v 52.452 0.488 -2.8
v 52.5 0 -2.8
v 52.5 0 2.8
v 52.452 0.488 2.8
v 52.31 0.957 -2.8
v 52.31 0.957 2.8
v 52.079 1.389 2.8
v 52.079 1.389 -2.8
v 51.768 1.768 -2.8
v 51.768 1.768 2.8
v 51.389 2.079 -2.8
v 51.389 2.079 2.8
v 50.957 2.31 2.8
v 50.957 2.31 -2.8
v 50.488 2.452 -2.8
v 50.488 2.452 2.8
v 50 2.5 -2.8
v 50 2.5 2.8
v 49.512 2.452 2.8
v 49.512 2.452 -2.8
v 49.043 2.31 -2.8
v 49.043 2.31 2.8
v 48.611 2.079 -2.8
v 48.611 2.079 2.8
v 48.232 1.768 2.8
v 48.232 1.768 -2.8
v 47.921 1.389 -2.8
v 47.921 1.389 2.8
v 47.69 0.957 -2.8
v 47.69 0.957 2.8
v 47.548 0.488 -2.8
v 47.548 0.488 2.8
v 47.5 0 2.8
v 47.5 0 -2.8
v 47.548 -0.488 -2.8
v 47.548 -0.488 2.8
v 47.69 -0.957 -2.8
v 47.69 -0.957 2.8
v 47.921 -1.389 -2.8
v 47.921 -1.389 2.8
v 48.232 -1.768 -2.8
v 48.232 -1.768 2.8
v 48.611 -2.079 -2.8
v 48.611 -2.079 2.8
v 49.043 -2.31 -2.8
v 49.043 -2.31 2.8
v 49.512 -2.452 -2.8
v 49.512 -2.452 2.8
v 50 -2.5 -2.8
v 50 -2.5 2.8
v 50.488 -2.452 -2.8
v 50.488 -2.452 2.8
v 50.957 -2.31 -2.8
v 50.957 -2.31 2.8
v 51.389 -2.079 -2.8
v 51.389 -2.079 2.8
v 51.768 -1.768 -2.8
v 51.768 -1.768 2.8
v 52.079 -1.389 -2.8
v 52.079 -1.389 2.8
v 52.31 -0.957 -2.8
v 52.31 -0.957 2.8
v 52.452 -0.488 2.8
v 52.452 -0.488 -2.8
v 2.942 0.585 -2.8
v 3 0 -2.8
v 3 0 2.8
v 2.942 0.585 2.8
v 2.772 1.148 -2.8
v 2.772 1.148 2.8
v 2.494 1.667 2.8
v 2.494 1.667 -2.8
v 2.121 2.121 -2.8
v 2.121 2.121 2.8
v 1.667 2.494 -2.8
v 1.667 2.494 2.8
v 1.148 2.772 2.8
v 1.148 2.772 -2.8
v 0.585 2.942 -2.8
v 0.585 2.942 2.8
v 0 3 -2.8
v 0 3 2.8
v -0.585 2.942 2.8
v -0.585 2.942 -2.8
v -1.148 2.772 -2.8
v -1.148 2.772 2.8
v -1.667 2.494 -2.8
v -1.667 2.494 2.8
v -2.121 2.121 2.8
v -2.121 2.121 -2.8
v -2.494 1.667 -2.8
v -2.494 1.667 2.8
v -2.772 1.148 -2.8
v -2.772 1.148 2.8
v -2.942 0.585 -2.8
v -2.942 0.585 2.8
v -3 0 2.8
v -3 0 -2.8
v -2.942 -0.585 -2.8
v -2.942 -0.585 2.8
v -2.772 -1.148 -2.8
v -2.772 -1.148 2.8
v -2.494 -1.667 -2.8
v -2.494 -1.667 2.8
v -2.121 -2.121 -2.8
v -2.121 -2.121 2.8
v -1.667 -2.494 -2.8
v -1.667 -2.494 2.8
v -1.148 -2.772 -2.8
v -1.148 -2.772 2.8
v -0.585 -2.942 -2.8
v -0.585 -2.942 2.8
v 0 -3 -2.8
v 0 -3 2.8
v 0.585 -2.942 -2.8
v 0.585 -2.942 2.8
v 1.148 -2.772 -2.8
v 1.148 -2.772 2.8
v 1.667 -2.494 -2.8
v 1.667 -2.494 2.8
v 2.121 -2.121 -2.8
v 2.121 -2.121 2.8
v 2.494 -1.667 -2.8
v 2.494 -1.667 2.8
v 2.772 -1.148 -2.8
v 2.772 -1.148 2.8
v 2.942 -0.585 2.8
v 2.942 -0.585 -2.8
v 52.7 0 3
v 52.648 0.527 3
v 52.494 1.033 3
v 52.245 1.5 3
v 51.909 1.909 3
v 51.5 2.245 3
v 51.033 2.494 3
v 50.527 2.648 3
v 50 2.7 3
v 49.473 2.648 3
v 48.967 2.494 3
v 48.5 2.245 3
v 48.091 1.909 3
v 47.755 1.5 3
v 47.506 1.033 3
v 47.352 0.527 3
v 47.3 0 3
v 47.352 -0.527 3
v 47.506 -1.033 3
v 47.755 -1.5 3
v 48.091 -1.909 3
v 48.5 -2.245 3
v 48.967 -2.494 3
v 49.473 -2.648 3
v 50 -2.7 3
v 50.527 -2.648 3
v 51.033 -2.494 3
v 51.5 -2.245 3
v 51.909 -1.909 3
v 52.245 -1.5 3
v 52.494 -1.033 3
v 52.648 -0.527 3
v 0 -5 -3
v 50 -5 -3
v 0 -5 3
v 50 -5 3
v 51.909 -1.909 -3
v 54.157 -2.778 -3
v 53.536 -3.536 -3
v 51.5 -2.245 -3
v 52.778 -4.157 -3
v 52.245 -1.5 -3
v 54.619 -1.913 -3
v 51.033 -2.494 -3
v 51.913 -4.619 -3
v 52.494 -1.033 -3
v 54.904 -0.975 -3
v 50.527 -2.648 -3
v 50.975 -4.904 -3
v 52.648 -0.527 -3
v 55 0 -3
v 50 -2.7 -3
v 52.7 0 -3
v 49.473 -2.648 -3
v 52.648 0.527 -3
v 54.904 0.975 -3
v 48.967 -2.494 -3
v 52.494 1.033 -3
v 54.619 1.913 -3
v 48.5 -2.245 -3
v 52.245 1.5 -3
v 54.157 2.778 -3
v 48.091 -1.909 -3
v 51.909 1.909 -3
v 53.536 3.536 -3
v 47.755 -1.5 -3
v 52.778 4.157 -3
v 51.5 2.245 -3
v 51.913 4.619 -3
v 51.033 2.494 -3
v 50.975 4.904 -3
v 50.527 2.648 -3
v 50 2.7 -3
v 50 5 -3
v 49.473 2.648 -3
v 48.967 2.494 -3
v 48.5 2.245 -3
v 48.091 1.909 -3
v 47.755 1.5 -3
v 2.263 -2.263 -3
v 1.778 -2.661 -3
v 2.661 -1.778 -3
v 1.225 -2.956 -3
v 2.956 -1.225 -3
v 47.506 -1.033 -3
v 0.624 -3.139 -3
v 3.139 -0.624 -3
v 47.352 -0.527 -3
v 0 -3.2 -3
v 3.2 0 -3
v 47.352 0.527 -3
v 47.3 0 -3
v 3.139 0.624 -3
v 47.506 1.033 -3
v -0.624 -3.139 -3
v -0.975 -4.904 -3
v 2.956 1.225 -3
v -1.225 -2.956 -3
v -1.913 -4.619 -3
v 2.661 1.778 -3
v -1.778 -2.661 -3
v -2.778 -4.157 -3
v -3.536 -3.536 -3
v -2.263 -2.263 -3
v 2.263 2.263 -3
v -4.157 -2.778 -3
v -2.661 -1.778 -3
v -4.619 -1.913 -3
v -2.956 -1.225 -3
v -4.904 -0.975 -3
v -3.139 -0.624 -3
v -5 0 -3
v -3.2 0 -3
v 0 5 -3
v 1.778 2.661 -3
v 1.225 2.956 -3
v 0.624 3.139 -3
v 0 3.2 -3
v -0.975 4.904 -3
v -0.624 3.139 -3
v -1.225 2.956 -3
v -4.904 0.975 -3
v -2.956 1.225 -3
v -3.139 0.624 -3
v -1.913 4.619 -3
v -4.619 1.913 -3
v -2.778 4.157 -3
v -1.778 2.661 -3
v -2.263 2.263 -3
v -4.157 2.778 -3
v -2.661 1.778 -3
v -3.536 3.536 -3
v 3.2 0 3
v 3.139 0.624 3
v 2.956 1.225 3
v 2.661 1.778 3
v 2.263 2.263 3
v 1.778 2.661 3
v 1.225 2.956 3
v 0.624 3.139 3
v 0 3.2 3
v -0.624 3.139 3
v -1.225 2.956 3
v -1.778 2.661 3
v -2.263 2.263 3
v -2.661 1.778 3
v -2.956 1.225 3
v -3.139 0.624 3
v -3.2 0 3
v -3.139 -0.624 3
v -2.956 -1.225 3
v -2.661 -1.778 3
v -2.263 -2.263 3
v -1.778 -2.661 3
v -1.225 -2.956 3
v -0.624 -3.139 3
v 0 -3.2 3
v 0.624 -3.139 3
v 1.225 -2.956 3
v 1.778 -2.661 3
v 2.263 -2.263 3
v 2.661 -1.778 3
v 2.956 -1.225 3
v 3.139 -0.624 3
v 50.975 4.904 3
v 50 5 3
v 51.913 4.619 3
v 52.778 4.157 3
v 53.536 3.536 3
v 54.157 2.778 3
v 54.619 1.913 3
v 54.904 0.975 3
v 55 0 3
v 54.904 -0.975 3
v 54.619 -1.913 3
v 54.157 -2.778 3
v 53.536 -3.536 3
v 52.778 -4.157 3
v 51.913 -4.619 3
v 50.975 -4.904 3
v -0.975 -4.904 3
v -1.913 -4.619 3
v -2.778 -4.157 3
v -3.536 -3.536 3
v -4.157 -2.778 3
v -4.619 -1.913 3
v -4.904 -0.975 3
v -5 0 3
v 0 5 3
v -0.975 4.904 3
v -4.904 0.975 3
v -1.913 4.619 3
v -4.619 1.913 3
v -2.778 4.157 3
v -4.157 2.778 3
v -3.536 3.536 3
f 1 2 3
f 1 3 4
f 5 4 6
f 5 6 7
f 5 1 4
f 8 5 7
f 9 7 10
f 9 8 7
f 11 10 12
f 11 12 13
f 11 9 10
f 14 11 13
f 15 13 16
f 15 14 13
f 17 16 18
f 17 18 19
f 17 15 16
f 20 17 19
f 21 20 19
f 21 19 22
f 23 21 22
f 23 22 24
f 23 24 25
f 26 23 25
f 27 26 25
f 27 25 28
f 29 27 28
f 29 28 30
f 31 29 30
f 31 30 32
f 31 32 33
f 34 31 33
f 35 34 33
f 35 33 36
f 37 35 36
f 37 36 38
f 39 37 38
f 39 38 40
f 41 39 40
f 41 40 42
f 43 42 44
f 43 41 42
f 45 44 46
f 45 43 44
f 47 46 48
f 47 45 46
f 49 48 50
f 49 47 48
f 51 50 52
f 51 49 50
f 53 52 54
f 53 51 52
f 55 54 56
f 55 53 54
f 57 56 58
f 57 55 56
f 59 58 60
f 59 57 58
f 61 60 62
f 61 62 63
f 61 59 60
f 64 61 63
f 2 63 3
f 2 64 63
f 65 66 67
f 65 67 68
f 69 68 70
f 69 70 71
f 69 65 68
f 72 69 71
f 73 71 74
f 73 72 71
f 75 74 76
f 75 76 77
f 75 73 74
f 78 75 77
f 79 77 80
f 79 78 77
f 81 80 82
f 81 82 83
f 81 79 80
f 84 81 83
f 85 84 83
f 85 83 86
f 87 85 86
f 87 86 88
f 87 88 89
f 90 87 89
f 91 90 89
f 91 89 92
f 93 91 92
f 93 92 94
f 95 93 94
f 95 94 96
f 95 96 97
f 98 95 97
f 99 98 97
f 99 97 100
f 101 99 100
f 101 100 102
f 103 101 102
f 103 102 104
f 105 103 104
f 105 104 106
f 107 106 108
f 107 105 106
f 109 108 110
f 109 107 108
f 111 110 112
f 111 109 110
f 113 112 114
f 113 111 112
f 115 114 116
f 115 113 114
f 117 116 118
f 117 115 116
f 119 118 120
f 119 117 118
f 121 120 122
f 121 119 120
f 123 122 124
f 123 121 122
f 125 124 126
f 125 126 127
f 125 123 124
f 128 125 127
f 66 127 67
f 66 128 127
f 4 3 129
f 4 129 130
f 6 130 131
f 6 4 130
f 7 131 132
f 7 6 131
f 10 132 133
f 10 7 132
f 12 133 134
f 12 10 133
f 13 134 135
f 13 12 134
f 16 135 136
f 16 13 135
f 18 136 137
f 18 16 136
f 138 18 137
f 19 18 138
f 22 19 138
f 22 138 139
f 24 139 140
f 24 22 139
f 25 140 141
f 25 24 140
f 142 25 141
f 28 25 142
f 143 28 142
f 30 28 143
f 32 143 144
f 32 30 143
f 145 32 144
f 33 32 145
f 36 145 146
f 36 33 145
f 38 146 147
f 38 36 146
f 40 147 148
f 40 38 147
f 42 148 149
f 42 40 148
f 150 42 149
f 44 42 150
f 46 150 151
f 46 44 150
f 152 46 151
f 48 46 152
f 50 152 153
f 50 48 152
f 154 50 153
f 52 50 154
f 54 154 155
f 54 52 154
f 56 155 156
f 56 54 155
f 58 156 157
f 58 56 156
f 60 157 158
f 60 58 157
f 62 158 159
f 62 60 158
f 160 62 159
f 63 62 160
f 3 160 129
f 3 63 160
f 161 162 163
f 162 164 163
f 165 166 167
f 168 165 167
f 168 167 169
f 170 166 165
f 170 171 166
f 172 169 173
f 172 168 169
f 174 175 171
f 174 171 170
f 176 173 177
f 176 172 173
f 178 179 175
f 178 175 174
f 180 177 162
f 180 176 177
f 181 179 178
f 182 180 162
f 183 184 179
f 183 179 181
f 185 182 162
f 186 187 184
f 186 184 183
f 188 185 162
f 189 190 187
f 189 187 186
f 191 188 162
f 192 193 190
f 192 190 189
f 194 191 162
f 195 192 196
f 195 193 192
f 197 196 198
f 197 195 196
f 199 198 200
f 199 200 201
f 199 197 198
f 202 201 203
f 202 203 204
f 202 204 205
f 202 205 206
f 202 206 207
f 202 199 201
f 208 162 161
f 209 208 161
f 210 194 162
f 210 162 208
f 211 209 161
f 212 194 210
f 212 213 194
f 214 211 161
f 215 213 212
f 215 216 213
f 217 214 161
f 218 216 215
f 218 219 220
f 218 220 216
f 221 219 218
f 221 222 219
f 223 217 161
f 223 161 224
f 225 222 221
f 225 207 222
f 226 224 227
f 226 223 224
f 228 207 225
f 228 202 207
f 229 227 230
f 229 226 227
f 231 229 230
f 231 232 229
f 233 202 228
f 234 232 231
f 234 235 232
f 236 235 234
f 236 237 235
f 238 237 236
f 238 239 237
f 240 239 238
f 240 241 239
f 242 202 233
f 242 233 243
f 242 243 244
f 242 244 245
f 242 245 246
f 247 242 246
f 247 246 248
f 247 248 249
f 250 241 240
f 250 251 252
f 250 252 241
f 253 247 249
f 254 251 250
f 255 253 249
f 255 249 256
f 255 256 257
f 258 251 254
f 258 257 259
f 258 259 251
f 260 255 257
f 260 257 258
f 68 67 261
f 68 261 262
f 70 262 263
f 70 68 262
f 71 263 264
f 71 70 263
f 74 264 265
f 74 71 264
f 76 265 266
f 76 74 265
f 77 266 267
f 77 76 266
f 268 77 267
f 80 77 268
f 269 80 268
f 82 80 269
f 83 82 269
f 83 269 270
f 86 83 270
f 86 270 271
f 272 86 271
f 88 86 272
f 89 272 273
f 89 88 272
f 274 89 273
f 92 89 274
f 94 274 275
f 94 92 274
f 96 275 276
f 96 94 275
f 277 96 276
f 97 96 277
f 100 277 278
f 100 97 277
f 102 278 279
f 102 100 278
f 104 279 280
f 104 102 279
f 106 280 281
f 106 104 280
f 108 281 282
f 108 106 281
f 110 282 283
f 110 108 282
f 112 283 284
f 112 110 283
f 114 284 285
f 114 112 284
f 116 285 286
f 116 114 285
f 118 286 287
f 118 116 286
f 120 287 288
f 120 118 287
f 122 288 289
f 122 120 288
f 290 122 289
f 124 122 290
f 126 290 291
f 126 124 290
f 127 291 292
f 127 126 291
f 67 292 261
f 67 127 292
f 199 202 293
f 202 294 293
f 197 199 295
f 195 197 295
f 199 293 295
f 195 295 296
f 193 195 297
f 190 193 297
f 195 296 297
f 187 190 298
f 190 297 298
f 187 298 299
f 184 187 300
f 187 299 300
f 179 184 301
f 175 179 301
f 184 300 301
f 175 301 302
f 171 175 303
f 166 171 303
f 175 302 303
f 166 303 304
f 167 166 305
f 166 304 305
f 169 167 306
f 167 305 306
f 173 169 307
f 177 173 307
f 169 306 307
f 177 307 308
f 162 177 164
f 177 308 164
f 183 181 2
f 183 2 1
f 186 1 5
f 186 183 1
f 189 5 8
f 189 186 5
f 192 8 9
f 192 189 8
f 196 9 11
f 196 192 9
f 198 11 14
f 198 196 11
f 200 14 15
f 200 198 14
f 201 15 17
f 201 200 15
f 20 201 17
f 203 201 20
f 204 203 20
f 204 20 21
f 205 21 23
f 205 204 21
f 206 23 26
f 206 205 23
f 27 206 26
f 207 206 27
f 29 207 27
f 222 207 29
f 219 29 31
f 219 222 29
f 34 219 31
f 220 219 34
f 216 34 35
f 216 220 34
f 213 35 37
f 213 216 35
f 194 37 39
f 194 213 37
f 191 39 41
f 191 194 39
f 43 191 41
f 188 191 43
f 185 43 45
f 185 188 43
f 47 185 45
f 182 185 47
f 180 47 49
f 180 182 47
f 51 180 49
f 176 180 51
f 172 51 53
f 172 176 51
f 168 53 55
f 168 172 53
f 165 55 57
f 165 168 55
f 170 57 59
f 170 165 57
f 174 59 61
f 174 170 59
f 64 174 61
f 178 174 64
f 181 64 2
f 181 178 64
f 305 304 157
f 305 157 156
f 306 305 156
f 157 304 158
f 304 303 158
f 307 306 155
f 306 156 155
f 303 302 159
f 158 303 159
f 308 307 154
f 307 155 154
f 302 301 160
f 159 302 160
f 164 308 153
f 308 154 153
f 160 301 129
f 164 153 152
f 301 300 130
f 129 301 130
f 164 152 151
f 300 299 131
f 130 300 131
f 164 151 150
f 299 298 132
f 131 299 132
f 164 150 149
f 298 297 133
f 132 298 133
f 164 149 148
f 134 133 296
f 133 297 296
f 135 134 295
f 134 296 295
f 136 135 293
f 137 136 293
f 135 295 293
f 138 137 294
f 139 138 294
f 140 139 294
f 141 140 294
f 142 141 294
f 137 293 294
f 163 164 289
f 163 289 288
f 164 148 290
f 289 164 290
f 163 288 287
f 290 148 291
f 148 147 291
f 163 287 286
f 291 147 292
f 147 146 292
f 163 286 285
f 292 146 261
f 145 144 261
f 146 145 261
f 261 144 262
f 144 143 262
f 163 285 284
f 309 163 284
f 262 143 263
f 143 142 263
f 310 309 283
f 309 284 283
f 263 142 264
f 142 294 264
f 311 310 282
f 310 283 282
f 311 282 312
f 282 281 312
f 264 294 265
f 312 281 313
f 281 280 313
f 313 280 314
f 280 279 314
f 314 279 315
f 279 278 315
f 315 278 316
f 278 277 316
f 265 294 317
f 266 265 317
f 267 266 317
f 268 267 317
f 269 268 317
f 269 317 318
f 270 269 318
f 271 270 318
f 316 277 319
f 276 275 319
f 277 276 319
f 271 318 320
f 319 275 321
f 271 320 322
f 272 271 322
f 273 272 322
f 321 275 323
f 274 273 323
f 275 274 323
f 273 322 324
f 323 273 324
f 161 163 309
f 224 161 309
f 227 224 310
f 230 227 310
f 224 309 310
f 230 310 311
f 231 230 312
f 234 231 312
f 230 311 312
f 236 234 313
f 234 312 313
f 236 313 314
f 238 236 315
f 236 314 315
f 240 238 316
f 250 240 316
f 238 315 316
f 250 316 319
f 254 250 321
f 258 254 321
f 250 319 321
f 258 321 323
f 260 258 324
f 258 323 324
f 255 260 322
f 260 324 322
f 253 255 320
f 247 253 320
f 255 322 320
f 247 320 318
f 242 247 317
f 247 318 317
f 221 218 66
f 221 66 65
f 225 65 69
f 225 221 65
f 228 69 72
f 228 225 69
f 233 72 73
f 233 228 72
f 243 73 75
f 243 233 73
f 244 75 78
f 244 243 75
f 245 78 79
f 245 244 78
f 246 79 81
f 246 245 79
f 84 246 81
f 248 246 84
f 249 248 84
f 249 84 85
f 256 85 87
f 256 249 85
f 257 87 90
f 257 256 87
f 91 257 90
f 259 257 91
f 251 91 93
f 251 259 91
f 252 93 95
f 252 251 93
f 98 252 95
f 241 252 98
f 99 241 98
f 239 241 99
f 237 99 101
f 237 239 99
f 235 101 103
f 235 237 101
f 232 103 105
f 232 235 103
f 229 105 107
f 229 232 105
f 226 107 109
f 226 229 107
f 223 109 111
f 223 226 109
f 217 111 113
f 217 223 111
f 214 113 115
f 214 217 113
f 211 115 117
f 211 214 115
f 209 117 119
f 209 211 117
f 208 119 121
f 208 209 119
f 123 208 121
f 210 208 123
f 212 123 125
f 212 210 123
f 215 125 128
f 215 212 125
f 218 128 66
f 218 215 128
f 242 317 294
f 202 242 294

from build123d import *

# Parameters (mm, degrees)
SKETCH1_R           = 2.5
SKETCH1_R_2         = 3
BOSS_EXTRUDE1_DEPTH = 3
CHAMFER_1_SIZE      = 0.2


with BuildPart() as part:
    # Sketch1 → Boss-Extrude1 (new, symmetric)
    with BuildSketch(Plane.XY):
        with BuildLine():
            Line((0, 5), (50, 5))
            ThreePointArc((50, 5), (55, 0), (50, -5))
            Line((50, -5), (0, -5))
            ThreePointArc((0, -5), (-5, 0), (0, 5))
        make_face()
        with Locations((50, 0)):
            Circle(SKETCH1_R, mode=Mode.SUBTRACT)
        Circle(SKETCH1_R_2, mode=Mode.SUBTRACT)
    extrude(amount=BOSS_EXTRUDE1_DEPTH, both=True)

    # 倒角1
    chamfer_1_edges = [part.edges().sort_by_distance(p)[0] for p in [
        (47.5, 0, -3),
        (47.5, 0, 3),
        (-3, 0, -3),
        (-3, 0, 3),
    ]]
    chamfer(chamfer_1_edges, length=CHAMFER_1_SIZE)


solid = part.part
